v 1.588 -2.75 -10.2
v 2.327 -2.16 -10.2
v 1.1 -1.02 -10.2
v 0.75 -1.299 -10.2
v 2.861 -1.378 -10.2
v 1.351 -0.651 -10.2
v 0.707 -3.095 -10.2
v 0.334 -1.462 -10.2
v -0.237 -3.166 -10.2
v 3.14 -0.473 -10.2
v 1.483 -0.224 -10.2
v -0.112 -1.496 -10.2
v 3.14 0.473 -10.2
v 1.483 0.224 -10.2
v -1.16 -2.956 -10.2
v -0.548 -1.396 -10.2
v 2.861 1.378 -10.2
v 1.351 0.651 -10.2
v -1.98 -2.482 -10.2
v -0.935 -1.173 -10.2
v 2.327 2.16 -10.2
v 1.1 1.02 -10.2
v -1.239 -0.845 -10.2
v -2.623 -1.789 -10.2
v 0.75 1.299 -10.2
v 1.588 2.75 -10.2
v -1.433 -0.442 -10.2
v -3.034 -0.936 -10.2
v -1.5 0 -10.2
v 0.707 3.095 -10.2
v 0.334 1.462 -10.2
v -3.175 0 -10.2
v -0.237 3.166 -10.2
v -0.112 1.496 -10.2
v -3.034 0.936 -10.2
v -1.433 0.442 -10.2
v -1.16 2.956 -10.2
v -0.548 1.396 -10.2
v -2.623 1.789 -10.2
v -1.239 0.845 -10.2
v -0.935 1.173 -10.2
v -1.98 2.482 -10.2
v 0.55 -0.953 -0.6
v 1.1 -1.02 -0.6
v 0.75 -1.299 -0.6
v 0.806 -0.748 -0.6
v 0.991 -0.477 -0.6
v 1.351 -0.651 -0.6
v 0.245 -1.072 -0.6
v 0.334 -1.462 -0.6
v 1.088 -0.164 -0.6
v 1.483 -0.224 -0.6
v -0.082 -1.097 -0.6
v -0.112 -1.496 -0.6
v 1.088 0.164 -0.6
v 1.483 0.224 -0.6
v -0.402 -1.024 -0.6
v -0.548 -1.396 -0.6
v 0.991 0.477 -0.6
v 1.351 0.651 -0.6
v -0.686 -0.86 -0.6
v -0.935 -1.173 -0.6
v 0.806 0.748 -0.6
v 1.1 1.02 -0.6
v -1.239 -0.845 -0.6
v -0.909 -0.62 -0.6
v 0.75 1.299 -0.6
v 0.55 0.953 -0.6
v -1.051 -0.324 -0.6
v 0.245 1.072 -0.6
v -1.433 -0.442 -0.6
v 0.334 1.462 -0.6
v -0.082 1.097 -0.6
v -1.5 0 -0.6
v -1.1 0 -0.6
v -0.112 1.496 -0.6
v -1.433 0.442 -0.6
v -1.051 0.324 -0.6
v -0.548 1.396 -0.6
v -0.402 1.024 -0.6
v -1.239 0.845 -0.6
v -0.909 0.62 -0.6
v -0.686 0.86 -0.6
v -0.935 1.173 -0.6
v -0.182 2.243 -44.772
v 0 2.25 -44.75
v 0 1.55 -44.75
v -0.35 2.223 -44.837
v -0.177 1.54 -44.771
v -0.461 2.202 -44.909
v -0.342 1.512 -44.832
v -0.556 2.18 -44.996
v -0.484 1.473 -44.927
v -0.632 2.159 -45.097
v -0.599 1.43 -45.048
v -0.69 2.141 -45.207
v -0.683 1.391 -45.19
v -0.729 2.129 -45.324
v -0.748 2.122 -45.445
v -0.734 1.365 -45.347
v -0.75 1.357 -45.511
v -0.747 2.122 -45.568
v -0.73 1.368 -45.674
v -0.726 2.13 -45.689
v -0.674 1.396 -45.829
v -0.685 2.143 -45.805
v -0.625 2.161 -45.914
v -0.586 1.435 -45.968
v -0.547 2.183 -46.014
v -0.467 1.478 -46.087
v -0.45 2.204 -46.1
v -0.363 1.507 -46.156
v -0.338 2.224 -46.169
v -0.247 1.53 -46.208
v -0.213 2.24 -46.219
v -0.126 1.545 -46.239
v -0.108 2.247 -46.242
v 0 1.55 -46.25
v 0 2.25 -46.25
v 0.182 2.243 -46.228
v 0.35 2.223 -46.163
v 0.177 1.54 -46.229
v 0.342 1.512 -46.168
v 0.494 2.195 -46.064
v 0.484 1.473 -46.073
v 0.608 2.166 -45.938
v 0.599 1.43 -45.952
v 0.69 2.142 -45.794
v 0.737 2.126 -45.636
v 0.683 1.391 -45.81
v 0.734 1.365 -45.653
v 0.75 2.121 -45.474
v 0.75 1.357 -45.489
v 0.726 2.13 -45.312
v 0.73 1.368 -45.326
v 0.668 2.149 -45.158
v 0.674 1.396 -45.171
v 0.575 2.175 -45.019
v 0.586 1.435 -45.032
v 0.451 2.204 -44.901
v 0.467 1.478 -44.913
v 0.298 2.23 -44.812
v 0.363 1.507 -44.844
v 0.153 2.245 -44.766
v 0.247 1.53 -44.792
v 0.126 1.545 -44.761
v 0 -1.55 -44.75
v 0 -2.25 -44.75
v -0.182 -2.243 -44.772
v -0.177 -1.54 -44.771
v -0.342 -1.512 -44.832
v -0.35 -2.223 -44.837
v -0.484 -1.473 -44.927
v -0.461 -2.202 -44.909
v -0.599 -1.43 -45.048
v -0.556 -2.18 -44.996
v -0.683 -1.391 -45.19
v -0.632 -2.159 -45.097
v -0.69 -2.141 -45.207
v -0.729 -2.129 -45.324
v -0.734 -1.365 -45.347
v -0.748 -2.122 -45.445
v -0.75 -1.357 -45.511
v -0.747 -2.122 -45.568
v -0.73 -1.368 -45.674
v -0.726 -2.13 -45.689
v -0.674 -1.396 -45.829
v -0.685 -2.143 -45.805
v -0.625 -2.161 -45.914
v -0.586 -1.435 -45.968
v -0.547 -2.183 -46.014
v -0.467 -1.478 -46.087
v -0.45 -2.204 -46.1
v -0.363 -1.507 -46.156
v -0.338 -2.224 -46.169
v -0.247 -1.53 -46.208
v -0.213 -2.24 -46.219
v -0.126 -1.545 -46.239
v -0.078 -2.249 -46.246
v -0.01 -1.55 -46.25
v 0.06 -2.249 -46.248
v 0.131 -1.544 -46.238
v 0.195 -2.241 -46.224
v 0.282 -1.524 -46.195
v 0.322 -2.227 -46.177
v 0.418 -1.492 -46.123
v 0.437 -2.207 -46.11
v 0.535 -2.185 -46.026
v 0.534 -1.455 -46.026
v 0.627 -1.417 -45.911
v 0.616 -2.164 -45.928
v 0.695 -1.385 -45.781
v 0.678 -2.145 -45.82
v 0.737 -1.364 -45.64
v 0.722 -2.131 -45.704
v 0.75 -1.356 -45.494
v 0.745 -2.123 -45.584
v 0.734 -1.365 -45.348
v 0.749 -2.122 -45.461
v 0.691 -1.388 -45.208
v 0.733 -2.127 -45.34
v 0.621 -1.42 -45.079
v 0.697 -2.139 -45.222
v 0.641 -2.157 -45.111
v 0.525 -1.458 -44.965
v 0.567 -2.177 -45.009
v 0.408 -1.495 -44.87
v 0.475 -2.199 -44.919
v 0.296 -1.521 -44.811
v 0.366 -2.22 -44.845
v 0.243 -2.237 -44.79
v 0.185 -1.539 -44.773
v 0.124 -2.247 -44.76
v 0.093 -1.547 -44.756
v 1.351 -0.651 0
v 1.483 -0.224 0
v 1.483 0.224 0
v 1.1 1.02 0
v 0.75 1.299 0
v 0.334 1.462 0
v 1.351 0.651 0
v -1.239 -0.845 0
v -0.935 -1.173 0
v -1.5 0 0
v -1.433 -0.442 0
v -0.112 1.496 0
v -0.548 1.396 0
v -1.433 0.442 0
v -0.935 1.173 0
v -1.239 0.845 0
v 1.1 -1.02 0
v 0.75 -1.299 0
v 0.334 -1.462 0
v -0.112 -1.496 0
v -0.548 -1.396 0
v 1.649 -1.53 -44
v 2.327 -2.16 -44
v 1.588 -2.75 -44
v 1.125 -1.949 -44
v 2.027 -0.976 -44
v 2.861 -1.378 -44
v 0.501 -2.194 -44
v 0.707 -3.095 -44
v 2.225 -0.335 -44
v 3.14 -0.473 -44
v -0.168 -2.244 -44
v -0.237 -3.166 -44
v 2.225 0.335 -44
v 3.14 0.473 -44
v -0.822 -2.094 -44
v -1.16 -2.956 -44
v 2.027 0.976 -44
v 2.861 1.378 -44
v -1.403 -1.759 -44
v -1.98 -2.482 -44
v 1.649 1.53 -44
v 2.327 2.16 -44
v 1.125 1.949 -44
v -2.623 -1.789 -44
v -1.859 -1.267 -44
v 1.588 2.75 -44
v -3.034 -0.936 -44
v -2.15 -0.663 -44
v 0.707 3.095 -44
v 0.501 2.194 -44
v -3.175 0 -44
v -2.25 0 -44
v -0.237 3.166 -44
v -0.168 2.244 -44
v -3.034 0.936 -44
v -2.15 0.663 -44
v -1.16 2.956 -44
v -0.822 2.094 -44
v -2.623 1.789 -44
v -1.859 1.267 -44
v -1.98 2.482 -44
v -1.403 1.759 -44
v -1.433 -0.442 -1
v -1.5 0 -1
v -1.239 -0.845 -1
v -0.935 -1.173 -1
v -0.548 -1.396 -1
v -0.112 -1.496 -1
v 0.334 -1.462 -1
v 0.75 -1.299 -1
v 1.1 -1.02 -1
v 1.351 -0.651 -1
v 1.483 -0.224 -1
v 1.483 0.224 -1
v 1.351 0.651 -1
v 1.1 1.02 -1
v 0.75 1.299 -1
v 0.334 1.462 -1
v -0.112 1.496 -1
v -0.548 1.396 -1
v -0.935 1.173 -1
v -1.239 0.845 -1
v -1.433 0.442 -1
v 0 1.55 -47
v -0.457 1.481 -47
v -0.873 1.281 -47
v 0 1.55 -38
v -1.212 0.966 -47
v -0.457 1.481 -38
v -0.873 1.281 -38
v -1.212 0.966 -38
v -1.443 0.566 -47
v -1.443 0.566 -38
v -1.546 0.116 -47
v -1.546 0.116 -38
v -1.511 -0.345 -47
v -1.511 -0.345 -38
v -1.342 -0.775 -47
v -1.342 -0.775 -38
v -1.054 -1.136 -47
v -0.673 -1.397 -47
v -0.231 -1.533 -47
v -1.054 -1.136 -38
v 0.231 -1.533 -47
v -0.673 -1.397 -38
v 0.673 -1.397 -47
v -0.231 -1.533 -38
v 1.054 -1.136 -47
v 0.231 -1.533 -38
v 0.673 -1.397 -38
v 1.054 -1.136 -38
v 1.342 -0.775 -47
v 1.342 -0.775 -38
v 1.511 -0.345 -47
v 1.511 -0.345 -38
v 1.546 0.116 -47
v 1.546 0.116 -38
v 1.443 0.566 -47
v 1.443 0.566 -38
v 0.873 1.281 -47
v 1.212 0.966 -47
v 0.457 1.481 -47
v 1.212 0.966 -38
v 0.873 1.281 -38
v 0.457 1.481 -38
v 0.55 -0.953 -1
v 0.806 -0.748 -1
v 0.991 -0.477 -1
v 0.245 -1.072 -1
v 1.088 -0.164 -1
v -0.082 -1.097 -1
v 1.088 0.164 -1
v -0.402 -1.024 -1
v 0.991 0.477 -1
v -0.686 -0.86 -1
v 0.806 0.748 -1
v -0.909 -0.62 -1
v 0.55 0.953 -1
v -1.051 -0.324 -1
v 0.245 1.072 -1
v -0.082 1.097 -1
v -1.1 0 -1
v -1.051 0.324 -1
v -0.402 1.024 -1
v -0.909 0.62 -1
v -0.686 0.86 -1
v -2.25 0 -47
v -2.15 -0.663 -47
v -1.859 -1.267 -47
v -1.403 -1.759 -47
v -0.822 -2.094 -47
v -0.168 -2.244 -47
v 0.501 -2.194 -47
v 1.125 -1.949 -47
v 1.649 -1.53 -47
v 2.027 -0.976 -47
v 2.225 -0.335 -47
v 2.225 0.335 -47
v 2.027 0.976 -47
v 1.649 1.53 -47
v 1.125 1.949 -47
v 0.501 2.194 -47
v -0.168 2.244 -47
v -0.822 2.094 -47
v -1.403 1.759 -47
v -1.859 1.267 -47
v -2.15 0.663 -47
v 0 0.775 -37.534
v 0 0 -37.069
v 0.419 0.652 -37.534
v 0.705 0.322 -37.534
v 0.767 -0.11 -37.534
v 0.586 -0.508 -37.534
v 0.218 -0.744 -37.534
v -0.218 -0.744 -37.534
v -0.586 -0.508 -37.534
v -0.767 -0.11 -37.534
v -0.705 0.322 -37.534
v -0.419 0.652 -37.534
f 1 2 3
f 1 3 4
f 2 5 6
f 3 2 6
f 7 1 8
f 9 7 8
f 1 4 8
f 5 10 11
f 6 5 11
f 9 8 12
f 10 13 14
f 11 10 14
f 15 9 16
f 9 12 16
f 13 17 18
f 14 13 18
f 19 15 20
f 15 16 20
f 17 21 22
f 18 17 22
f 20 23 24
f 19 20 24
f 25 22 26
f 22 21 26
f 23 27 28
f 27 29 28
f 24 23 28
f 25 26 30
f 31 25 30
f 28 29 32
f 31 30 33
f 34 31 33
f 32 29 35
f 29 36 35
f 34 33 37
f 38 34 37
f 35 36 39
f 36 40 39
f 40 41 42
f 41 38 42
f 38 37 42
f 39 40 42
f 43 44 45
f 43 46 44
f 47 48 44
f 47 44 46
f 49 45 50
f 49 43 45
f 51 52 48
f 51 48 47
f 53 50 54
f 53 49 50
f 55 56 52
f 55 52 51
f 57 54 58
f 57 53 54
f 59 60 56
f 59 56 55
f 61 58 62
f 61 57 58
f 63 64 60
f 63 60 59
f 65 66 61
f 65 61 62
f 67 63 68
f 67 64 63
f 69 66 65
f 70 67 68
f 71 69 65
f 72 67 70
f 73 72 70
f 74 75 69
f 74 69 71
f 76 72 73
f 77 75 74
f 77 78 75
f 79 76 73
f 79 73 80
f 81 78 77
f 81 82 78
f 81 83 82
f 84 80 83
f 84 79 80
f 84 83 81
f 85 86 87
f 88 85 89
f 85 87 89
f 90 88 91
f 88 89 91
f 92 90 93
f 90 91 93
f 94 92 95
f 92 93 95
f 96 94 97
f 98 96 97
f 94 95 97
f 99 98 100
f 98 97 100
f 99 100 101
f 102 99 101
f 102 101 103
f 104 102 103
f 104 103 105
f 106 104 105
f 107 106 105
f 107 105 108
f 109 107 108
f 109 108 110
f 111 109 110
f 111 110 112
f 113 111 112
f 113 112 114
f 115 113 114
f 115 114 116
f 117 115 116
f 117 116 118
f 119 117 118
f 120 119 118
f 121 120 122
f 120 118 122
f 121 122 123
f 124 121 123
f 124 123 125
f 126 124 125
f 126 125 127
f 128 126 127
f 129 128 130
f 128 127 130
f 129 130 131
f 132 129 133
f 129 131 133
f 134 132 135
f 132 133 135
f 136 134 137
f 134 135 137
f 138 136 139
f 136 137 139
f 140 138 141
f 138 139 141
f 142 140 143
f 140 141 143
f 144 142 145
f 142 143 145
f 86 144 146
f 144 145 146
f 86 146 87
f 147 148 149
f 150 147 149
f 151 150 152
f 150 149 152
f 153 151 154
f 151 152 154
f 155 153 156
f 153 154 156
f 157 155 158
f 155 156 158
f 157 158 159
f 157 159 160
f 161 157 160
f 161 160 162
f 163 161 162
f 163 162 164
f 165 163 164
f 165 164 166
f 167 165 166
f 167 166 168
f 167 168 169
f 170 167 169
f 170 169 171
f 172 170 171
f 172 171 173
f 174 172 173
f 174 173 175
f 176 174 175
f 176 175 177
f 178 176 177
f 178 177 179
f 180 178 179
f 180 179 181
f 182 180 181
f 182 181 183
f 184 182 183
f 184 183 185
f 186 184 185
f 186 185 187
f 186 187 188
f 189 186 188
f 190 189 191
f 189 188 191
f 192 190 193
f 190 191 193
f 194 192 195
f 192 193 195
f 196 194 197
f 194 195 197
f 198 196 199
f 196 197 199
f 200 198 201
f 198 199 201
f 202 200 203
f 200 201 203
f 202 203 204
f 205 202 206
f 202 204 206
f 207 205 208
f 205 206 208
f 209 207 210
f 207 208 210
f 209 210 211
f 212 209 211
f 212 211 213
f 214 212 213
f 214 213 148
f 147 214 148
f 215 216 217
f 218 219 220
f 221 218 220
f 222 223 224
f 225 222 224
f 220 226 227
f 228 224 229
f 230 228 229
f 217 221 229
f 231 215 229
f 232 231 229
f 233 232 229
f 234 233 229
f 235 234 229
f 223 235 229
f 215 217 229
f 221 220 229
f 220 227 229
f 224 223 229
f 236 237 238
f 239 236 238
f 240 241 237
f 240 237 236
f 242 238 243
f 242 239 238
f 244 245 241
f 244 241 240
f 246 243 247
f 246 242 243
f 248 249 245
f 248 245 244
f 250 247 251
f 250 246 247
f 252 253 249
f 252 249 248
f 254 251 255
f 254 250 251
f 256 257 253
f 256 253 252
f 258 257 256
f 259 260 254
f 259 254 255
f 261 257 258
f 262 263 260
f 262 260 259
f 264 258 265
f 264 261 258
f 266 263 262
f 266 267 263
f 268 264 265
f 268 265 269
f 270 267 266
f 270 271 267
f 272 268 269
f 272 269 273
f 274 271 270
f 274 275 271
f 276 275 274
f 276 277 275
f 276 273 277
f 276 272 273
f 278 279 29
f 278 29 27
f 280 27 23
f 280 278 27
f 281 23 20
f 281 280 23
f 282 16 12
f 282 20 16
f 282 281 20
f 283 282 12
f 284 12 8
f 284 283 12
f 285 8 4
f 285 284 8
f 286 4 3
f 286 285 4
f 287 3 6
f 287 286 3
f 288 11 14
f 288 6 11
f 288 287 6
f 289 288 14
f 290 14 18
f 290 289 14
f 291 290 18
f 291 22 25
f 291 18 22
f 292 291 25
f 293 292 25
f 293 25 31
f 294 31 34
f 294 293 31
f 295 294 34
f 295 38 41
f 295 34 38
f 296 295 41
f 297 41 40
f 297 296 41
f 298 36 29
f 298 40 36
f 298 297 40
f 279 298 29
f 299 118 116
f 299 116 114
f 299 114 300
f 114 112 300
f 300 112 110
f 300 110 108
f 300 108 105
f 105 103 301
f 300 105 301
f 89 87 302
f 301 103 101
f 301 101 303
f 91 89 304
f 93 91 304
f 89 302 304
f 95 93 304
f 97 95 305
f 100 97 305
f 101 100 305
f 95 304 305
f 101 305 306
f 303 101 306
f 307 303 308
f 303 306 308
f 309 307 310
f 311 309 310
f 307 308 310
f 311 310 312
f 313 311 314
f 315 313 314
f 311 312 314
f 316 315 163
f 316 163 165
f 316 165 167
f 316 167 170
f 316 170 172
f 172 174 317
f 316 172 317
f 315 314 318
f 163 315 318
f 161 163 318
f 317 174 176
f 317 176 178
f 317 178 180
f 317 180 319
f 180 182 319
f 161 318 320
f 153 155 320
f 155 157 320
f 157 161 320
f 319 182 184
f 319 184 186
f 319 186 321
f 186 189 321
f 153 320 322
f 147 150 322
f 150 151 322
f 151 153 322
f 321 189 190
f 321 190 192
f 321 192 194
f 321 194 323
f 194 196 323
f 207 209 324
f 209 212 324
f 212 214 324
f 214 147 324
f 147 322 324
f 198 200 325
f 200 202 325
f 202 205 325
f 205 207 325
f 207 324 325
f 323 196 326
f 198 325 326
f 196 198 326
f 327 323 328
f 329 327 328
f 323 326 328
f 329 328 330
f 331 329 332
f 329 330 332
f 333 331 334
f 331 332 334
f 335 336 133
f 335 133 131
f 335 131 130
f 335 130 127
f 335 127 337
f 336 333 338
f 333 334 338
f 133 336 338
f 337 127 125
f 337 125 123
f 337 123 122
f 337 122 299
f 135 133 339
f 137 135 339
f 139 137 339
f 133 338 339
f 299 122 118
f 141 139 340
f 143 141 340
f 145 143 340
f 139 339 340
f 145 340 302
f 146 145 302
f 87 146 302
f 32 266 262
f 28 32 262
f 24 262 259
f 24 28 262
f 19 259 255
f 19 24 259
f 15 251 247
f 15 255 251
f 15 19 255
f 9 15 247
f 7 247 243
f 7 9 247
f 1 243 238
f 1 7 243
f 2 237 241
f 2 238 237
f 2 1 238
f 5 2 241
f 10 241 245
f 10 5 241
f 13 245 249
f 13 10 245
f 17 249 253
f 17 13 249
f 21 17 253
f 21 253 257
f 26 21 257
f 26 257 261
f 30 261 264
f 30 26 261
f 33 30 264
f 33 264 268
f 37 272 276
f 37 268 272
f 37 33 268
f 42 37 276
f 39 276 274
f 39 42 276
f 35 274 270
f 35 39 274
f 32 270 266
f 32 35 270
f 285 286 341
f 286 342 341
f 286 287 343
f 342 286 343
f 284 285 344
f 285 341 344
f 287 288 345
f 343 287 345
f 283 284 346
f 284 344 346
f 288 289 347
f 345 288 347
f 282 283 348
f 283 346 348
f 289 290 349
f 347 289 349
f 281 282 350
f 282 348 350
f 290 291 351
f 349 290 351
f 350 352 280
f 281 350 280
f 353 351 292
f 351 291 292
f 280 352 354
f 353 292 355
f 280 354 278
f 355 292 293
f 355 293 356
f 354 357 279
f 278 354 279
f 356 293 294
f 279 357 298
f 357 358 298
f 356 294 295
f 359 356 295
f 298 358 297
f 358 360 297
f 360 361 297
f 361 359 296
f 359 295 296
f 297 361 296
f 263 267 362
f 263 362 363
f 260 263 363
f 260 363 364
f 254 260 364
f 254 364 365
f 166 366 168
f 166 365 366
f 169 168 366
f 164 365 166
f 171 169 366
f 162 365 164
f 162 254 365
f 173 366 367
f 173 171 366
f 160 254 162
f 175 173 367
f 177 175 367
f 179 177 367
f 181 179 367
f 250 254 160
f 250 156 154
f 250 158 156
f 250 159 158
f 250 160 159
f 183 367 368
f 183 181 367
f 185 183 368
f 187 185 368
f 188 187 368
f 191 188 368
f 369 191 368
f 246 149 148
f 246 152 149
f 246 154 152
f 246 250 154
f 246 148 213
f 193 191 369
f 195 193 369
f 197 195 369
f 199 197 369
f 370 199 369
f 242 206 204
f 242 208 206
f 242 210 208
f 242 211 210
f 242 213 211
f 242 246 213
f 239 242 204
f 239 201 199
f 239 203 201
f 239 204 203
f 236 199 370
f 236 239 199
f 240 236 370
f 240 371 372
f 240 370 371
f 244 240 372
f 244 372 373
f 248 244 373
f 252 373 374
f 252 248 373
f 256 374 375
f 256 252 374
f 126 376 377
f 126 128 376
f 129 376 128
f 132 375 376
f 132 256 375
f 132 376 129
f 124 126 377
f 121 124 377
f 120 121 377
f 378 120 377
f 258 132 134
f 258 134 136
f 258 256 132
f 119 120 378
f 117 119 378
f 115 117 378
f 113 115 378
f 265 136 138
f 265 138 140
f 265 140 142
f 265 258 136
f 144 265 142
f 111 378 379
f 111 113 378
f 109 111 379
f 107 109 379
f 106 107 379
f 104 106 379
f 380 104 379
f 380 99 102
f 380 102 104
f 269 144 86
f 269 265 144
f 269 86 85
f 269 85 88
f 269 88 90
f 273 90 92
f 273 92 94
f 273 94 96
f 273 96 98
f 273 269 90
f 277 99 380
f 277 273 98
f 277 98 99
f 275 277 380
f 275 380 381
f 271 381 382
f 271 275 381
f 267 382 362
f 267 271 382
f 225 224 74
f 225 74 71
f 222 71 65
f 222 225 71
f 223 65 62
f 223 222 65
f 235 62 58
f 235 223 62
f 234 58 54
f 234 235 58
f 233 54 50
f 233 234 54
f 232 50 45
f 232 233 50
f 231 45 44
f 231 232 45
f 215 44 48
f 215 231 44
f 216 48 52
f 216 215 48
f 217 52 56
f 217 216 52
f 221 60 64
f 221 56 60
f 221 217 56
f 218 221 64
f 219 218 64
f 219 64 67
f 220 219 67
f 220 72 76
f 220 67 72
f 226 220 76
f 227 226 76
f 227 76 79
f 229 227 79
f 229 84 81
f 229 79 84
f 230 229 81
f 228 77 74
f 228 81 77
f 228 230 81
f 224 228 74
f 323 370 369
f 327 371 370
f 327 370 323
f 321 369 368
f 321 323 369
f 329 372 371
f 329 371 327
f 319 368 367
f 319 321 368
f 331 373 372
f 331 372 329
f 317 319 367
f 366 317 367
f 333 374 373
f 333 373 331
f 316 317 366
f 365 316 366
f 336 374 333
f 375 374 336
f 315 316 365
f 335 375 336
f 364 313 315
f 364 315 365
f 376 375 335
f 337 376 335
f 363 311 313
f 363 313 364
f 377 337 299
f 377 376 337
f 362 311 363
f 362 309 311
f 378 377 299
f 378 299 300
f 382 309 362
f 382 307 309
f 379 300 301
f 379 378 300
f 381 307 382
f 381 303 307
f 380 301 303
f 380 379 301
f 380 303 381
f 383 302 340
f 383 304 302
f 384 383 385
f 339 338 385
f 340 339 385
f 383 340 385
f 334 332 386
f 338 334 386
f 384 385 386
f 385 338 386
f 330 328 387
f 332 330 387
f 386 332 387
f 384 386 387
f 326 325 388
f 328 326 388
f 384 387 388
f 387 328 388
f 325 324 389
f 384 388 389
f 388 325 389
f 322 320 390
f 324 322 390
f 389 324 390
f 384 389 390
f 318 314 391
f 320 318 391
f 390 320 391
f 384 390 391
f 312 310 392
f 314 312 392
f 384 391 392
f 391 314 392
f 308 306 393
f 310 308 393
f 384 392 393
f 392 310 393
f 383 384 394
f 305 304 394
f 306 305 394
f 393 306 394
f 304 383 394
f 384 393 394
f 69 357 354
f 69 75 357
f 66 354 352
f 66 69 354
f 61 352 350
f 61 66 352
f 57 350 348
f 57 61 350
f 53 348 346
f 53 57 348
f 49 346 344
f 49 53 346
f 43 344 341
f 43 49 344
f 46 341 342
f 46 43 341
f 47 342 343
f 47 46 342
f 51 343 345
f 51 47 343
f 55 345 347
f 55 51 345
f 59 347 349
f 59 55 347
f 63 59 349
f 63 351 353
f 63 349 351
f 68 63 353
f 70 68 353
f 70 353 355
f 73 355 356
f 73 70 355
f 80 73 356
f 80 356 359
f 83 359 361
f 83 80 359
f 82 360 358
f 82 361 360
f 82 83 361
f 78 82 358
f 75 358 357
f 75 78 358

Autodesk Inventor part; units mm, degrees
ref_plane "YZ Plane" through (0, 0, 0) normal (1, 0, 0) x (0, 1, 0)
ref_plane "XY Plane" through (0, 0, 0) normal (0, 0, 1) x (1, 0, 0)
sketch "Sketch1" plane through (0, 0, 0) normal (0, 1, 0) x (-1, 0, 0)
  line L0 (0, 9.9065) -> (0, -47)
  line L1 (0, -47) -> (2.25, -47)
  line L2 (2.25, -47) -> (2.25, -44)
  line L3 (2.25, -44) -> (3.175, -44)
  line L4 (3.175, -44) -> (3.175, -10.2)
  line L5 (3.175, -10.2) -> (1.5, -10.2)
  line L6 (1.5, -10.2) -> (1.5, -1)
  line L7 (1.5, -1) -> (1.1, -1)
  line L8 (1.1, -1) -> (1.1, -0.6)
  line L9 (1.1, -0.6) -> (1.5, -0.6)
  line L10 (1.5, -0.6) -> (1.5, 0)
  line L11 (1.5, 0) -> (0, 0)
  dimension "d0" = 33.8
  dimension "d1" = 3
  dimension "d2" = 10.2
  dimension "d3" = 4.5
  dimension "d4" = 6.35
  dimension "d5" = 3
  dimension "d6" = 0.4
  dimension "d7" = 2.2
  dimension "d29" = 1
revolve "Revolution1" add sketch "Sketch1" angle 360 about axis through (0, 0, 9.9065) along (0, 0, -1)
thread "Thread1" size "M7x1" class "6g" standard "ANSI Metric M Profile" full length
ref_plane "Work Plane1" through (0, 2.25, -45.5) normal (0, 1, 0) x (-1, 0, 0)
sketch "Sketch2" plane through (0, 2.25, -45.5) normal (0, 1, 0) x (-1, 0, 0)
  line L0 (-2.25, -1.5) -> (2.25, -1.5) projected
  line L1 (0, -1.5) -> (0, 45.5) construction
  point P0 (0, 0)
  dimension "d12" = 1.5
hole "Hole1" at (0, 2.25, -45.5) direction (0, -1, 0) diameter 1.5 end through all
hole "Hole2" at (0, 0, -47) direction (0, 0, 1) diameter 3.1 depth 9 tip angle 118
properties part number "igus_6.35x2.54_screw"
